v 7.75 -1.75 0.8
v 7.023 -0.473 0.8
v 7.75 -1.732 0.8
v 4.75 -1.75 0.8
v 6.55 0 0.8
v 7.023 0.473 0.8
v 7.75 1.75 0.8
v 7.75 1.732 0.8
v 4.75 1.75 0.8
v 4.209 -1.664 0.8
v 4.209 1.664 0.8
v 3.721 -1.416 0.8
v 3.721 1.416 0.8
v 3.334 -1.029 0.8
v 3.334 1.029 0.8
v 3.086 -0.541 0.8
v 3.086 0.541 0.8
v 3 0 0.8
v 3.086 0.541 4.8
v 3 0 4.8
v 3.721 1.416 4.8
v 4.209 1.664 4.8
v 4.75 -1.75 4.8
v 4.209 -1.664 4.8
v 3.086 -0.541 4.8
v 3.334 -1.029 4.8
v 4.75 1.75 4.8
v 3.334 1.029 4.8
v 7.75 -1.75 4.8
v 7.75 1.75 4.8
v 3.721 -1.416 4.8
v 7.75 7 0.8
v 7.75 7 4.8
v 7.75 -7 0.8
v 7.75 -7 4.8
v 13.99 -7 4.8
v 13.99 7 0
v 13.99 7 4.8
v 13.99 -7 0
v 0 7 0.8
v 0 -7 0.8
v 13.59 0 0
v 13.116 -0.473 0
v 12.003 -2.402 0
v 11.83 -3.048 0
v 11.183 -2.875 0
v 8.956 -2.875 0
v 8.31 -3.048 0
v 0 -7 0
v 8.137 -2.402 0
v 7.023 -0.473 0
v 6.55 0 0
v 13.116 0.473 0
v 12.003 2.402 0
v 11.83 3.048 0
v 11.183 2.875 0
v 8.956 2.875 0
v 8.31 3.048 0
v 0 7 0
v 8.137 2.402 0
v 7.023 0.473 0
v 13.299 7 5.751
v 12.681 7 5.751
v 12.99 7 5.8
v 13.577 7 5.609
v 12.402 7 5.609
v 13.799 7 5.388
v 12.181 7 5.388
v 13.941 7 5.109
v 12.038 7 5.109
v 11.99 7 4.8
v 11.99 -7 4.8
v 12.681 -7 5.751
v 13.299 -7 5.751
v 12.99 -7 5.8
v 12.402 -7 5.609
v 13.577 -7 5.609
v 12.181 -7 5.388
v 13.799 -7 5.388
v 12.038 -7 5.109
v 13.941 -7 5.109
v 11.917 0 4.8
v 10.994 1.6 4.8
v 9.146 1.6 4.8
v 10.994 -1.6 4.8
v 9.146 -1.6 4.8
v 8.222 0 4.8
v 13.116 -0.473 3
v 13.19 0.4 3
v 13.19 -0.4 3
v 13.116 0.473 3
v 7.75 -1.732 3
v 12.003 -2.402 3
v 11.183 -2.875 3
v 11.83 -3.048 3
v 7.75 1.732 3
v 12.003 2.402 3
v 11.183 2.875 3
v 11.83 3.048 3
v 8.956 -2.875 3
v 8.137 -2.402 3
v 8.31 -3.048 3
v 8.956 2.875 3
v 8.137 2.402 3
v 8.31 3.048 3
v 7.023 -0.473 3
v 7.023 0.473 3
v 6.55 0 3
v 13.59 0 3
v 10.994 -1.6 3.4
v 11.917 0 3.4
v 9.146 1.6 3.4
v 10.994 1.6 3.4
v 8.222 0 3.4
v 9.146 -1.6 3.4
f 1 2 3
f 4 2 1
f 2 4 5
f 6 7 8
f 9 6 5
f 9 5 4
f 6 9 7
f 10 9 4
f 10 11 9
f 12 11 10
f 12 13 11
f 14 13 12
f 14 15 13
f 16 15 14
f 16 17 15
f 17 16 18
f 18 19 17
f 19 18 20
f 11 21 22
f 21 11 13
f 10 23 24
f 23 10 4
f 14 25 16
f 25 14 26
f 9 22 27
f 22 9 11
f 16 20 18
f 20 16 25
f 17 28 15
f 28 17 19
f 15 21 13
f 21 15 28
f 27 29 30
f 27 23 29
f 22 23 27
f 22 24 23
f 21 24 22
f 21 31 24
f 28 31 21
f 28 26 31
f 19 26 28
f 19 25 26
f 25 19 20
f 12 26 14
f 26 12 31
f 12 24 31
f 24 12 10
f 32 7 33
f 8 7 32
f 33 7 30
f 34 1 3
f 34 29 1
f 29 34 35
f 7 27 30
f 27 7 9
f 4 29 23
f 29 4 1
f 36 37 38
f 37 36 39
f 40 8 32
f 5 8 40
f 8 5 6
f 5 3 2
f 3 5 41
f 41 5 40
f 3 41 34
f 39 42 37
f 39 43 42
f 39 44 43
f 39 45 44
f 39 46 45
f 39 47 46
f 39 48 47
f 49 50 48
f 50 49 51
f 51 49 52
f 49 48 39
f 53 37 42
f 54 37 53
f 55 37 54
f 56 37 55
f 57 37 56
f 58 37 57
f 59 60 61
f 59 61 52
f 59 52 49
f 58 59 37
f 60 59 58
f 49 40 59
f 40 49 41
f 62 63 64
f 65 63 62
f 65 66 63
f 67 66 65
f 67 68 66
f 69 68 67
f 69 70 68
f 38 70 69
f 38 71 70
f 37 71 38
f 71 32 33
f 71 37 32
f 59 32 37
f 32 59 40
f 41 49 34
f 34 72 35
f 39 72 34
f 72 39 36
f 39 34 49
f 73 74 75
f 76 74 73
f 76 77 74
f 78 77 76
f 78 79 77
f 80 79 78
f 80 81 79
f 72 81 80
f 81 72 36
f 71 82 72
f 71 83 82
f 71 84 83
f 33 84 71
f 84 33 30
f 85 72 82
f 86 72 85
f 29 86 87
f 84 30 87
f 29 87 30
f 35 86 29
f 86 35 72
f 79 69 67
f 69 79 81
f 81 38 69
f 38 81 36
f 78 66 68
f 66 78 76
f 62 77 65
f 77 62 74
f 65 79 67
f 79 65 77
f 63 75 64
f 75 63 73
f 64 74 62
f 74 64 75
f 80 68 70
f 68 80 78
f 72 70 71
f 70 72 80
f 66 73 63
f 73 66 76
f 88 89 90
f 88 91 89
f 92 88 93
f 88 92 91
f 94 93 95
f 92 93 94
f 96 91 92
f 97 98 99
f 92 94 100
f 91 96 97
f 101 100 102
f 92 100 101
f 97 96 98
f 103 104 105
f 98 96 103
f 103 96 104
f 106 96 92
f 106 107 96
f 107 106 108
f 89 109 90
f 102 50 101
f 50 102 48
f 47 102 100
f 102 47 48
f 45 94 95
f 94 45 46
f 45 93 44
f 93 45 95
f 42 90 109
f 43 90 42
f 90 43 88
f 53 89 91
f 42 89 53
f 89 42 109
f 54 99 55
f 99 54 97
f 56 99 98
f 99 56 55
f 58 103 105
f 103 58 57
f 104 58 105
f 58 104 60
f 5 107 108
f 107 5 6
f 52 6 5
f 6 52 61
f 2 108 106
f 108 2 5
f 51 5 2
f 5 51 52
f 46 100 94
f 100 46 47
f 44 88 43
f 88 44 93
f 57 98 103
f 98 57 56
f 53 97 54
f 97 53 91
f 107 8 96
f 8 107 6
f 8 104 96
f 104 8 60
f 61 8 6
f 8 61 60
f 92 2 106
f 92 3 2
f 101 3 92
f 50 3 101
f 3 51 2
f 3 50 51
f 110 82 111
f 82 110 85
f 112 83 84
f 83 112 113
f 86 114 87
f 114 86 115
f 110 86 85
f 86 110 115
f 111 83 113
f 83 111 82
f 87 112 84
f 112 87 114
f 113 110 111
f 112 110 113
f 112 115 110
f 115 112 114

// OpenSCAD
bolt_diameter=3.2;
nut_diameter=5.75;
nut_corner_diameter=nutcornerdiameter(nut_diameter);
nut_thickness=3;
face_thickness=0.8;
face_width=3;
notch_diameter=3.5;
notch_separation=30;
driver_depth=5;
driver_width=36;
driver_height=14;
pivot_radius=1;
nut_padding_inner=-1;
nut_padding_outer=0.6;
nut_separation=driver_width+nut_corner_diameter+2*nut_padding_inner;

union()
{
	difference()
	{
		union()
		{
			translate([0, -driver_height/2, 0]) cube([face_width+notch_diameter/2+(driver_width-notch_separation)/2+nut_padding_inner+nut_corner_diameter+nut_padding_outer,driver_height,face_thickness], center=false);
			translate([notch_diameter/2+face_width, 0, face_thickness]) notch(radius=notch_diameter/2, length=(driver_width-notch_separation)/2, height = driver_depth-pivot_radius);
			translate([face_width+notch_diameter/2+(driver_width-notch_separation)/2, -driver_height/2, face_thickness]) cube([nut_padding_inner+nut_corner_diameter+nut_padding_outer, driver_height, driver_depth-pivot_radius]);
			translate([face_width+notch_diameter/2+(driver_width-notch_separation)/2+nut_padding_inner+nut_corner_diameter+nut_padding_outer-pivot_radius,driver_height/2,face_thickness+driver_depth-pivot_radius]) rotate([90,0,0]) cylinder(r=pivot_radius, h=driver_height, $fn=20);
		
		}
		translate([(nut_separation)/2+(notch_diameter-notch_separation)/2+face_width, 0, -1]) nut(d=nut_diameter, h=nut_thickness+1, horizontal=true);
		translate([(nut_separation)/2+(notch_diameter-notch_separation)/2+face_width, 0, -1]) polyhole(d=bolt_diameter, h=face_thickness+driver_depth+2);
	}
	translate([face_width+notch_diameter/2+(driver_width-notch_separation)/2, -driver_height/2, nut_thickness]) cube([(nut_separation+nut_corner_diameter+nut_padding_inner+nut_padding_outer-driver_width)/2, driver_height, 0.4]);
}

module notch(radius, length, height)
{
	union()
	{
		translate([0,0,height/2]) cylinder(r=radius, h=height, center=true, $fn=20);
		translate([length/2, 0, height/2]) cube([length, radius*2, height], center=true);
	}
}

module nut( d, h, horizontal = true )
{
	cornerradius = nutcornerdiameter(d)/2;
	cylinder( h = h, r = cornerradius, $fn = 6 );
	if( horizontal )
	{
		for( i = [1 : 6] )
		{
			rotate( [0, 0, 60 * i] ) translate( [-cornerradius - 0.2, 0, 0] ) rotate( [0, 0, -45] ) cube( size = [2, 2, h] );
		}
	}
}

// By nophead
module polyhole( d, h ) 
{
	n = max( round( 2 * d ), 3 );
	rotate( [0, 0, 180] ) cylinder( h = h, r = ( d / 2 ) / cos( 180 / n ), $fn = n );
}

module roundcorner( diameter )
{
	difference()
	{
		cube( size = [diameter, diameter, 99], center = false );
		translate( v = [diameter, diameter, 0] ) cylinder( h = 100, r = diameter, center = true );
	}
}

function nutcornerdiameter(d) = ( d ) / cos( 180 / 6 );
